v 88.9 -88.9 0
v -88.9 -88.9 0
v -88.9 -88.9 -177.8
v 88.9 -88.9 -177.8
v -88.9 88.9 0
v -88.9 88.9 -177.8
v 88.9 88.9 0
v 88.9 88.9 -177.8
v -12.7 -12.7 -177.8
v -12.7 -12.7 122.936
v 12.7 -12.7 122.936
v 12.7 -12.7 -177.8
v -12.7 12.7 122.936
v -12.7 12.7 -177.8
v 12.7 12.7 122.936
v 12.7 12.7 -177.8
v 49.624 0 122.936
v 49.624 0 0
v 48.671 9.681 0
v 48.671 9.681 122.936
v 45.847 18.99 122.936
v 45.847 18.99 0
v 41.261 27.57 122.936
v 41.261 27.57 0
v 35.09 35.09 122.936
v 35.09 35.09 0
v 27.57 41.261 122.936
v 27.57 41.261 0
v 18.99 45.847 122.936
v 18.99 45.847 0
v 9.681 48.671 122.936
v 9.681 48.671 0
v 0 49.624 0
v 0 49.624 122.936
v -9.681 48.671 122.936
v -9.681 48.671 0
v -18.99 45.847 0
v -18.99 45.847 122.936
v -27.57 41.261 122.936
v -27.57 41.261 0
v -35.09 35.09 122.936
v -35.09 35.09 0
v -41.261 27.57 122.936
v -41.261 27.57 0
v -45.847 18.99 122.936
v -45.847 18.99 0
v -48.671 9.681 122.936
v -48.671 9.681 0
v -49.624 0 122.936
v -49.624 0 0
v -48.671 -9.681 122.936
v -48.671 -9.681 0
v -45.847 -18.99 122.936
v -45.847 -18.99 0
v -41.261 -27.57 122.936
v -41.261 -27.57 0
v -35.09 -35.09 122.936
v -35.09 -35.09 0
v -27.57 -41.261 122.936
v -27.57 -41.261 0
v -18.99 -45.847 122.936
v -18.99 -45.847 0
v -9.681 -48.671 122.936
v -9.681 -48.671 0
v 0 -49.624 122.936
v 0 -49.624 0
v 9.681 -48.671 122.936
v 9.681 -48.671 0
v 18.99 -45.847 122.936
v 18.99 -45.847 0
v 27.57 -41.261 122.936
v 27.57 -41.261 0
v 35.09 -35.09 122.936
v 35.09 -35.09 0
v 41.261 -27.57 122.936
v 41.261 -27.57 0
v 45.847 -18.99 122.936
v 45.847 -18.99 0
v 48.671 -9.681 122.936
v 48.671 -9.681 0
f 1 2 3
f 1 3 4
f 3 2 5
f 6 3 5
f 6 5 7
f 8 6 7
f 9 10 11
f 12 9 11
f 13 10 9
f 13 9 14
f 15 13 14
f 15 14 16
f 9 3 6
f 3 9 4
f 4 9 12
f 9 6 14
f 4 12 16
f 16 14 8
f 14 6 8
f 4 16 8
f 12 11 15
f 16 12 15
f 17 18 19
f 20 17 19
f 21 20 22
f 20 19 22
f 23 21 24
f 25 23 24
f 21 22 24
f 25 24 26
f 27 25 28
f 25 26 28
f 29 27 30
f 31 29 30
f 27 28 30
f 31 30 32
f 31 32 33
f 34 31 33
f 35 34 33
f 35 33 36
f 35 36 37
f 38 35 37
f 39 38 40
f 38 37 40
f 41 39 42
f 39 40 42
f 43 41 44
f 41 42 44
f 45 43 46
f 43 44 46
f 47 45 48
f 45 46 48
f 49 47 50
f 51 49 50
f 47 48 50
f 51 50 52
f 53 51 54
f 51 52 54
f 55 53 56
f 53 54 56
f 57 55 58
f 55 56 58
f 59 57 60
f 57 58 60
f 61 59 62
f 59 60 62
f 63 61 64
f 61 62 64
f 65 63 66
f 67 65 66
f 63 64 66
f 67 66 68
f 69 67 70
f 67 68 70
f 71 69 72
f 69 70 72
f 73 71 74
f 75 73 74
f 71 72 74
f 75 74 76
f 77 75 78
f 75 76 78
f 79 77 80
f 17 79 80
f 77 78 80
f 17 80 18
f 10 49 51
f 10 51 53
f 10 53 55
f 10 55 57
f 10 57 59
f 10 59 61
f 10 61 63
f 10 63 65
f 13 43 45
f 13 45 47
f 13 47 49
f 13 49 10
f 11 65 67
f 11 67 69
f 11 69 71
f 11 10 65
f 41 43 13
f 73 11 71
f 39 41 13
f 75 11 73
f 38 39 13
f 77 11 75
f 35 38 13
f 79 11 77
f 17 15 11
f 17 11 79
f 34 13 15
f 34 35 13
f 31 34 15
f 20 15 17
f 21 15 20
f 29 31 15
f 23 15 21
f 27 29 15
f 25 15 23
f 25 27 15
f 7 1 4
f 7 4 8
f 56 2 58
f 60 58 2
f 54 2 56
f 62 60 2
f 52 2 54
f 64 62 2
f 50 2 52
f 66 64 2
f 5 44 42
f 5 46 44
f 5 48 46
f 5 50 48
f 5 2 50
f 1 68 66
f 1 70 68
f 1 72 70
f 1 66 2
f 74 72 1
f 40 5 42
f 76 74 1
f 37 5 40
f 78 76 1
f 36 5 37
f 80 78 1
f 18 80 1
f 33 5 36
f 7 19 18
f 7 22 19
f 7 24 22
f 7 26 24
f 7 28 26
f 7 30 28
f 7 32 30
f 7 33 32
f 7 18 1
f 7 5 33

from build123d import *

# Parameters (mm, degrees)
F0_R     = 49.624192
F1_DEPTH = 122.936
F2_W     = 177.8
F2_H     = 177.8
F3_DEPTH = 177.8
F4_W     = 25.4
F4_H     = 25.4
F5_DEPTH = 376.936


with BuildPart() as f1:
    # F0 (on Top) → F1 (new body)
    with BuildSketch(Plane.XY):
        Circle(F0_R)
    extrude(amount=F1_DEPTH)

    # F2 (on Top) → F3 (join)
    with BuildSketch(Plane.XY):
        Rectangle(F2_W, F2_H)
    extrude(amount=-F3_DEPTH)

    # F4 (on face) → F5 (cut)
    with BuildSketch(Plane.XY.offset(122.936)):
        Rectangle(F4_W, F4_H)
    extrude(amount=-F5_DEPTH, mode=Mode.SUBTRACT)


solid = f1.part
